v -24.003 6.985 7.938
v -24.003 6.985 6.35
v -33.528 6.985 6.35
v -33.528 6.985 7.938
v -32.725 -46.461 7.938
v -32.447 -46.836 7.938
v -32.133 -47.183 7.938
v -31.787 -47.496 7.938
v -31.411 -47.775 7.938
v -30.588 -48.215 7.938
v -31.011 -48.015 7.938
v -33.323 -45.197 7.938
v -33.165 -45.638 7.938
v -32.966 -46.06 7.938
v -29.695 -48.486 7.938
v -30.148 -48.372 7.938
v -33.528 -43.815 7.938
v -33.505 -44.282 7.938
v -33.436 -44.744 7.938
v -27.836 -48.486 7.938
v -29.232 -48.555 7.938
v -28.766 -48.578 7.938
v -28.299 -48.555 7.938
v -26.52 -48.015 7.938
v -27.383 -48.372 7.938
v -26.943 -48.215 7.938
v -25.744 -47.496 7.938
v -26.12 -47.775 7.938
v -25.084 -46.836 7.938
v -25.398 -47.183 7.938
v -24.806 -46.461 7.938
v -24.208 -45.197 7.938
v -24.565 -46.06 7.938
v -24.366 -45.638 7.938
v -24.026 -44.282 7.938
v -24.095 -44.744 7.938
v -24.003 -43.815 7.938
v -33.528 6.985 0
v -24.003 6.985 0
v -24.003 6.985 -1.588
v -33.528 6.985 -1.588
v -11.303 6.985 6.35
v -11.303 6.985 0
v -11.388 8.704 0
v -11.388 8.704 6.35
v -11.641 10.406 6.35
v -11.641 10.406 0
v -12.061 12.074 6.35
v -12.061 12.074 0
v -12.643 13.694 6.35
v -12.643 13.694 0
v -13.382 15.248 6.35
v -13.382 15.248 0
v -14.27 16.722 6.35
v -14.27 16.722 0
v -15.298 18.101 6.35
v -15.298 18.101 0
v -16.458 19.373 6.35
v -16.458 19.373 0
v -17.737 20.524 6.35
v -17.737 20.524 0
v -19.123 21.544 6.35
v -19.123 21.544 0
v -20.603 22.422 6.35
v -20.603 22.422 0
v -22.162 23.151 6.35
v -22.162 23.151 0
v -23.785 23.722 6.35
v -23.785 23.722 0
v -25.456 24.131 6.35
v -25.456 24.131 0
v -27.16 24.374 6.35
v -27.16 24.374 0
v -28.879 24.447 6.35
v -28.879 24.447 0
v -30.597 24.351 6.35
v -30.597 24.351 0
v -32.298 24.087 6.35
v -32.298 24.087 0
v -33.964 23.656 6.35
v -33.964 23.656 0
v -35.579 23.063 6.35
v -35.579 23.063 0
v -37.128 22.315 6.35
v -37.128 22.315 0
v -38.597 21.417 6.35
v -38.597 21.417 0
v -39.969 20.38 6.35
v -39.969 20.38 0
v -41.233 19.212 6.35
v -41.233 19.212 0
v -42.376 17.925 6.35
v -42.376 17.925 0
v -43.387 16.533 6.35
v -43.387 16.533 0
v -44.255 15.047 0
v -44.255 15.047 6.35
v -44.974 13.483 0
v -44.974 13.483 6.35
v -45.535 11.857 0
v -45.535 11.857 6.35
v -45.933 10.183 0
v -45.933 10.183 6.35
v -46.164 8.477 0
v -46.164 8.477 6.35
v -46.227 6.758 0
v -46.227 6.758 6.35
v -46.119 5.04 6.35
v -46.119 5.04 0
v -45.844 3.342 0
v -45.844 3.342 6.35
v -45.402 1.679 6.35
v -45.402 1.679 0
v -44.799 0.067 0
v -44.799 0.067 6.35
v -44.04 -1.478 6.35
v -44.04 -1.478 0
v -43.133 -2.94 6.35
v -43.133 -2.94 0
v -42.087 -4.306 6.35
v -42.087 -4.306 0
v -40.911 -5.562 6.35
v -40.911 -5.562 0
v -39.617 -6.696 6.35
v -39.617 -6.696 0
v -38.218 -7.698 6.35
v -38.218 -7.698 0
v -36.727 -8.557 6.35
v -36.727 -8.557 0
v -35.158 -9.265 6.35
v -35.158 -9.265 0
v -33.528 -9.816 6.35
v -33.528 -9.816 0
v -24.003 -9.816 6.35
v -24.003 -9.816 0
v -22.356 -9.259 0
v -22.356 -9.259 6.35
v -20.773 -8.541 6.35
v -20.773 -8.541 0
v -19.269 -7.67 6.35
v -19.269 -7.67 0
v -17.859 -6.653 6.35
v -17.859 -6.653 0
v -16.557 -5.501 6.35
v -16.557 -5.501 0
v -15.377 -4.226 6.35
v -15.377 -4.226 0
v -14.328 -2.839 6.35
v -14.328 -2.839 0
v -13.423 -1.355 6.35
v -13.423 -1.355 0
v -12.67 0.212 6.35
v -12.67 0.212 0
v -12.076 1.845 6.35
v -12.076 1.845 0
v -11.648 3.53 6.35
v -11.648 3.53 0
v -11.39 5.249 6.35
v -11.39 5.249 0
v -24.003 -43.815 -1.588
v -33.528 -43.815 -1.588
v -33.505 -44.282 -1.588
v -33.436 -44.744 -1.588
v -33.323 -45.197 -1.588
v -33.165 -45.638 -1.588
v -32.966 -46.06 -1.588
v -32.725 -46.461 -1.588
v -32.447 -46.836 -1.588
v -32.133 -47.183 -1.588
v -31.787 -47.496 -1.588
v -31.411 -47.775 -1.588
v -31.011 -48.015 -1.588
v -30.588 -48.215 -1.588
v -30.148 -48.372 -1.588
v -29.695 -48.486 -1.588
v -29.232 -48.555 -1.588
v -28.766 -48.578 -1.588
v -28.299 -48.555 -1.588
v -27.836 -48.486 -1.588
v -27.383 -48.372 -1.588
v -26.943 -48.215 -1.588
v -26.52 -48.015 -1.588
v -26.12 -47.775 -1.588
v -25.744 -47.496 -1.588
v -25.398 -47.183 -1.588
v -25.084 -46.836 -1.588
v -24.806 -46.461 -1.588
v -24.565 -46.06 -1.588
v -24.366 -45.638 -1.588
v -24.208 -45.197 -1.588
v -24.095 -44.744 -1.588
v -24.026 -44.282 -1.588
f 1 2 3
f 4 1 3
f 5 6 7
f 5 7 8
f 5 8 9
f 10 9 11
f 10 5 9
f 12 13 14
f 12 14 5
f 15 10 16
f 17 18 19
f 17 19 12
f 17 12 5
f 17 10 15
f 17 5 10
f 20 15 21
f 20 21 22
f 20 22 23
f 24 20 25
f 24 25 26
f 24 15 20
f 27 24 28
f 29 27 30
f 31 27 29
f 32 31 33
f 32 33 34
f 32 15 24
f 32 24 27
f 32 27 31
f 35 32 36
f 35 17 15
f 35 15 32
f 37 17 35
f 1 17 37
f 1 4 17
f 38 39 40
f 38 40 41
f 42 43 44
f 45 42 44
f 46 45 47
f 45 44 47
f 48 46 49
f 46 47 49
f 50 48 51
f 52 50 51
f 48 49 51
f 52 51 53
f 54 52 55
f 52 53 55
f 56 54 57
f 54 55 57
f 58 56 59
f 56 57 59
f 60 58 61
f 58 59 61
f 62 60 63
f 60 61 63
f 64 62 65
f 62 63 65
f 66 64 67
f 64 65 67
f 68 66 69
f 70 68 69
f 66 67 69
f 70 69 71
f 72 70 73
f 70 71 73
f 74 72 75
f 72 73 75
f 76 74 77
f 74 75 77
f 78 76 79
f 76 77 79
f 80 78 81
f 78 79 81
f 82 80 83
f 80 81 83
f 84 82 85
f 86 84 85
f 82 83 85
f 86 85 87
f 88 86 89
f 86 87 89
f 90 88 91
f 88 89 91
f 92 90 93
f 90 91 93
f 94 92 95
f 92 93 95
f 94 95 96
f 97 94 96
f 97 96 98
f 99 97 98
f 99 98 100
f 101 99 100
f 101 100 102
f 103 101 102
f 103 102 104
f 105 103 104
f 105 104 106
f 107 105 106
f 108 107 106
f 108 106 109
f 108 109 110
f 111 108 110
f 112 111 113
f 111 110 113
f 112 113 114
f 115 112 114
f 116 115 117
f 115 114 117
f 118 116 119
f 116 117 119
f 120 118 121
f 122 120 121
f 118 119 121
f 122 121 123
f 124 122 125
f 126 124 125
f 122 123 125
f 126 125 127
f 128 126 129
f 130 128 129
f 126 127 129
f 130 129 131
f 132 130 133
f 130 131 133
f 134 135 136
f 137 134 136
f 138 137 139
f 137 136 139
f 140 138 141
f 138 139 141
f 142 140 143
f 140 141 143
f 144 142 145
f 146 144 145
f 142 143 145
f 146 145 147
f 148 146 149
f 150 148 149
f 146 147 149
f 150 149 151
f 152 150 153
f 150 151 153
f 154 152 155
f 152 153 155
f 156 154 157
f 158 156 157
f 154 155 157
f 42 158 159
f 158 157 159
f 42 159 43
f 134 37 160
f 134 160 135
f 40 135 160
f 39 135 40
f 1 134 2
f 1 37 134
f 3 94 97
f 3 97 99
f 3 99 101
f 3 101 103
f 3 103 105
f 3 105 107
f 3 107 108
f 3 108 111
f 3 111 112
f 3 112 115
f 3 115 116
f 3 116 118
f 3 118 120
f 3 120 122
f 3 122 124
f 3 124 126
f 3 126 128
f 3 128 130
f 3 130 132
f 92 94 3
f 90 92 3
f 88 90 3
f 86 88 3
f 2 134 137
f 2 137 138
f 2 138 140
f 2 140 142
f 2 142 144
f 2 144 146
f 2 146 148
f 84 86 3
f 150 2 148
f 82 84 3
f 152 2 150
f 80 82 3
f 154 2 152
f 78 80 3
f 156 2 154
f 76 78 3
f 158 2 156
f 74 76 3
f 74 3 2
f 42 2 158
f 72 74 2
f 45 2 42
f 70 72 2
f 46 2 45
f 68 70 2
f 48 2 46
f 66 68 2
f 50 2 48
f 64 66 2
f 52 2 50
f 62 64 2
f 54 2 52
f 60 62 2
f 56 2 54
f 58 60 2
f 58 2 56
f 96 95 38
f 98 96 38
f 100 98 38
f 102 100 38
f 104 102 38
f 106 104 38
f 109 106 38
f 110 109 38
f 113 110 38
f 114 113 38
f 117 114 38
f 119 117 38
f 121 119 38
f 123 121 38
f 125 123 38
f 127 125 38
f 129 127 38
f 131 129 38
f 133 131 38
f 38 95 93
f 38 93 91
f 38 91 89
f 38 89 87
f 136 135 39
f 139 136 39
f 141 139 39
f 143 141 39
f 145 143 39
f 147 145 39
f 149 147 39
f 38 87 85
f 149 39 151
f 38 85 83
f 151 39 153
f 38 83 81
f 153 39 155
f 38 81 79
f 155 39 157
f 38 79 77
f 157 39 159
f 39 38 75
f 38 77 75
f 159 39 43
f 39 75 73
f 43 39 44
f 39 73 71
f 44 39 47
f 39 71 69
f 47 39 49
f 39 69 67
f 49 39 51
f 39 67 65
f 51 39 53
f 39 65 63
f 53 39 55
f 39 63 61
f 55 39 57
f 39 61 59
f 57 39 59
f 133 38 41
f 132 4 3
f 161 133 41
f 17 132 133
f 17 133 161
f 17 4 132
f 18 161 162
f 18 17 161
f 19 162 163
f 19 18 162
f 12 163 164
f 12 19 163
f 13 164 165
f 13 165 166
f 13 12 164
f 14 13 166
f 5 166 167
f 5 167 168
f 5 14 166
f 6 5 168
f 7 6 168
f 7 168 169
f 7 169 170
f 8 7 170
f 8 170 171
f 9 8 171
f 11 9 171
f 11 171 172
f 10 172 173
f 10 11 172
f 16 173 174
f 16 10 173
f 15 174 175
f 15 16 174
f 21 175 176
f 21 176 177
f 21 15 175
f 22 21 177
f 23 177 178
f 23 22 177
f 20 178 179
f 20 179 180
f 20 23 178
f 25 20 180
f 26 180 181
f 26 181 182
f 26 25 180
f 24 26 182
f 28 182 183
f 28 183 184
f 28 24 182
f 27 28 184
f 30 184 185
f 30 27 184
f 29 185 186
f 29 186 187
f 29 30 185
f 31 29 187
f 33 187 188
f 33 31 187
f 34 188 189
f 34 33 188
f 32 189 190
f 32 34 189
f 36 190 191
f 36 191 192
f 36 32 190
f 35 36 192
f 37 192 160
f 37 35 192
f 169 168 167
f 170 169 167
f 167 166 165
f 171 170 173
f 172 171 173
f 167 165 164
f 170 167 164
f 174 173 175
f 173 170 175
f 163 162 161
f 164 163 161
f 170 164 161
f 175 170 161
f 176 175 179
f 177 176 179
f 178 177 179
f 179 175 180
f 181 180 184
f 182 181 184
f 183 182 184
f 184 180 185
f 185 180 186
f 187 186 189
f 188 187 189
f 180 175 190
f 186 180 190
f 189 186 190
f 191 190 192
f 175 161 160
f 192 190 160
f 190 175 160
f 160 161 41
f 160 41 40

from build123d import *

# Parameters (mm, degrees)
F1_DEPTH = 6.35
F2_DEPTH = 7.9375
F3_DEPTH = 1.5875


# Not quite as in the source:
# - a length typed as a fraction of an inch, garbled in the dataset ("3 / 203.2 mm" for 3/8 in), is restored


with BuildPart() as f1:
    # F0 (on Top) → F1 (new body)
    with BuildSketch(Plane.XY):
        with BuildLine():
            ThreePointArc((-24.0030003875, -9.8155226706), (-14.8352444226, -3.5452855547), (-11.3030003875, 6.9849981546))
            ThreePointArc((-11.3030003875, 6.9849981546), (-39.2957840969, 20.9152541196), (-33.5280003875, -9.8155226706))
            Line((-33.5280003875, -9.8155226706), (-33.5280003875, 6.9849981546))
            Line((-33.5280003875, 6.9849981546), (-24.0030003875, 6.9849981546))
            Line((-24.0030003875, 6.9849981546), (-24.0030003875, -9.8155226706))
        make_face()
    extrude(amount=F1_DEPTH)

    # F0 (on Top) → F2 (join)
    with BuildSketch(Plane.XY):
        with BuildLine():
            Line((-33.5280003875, 6.9849981546), (-33.5280003875, -9.8155226706))
            ThreePointArc((-33.5280003875, -9.8155226706), (-28.7655003875, -10.4775018454), (-24.0030003875, -9.8155226706))
            Line((-24.0030003875, -9.8155226706), (-24.0030003875, 6.9849981546))
            Line((-24.0030003875, 6.9849981546), (-33.5280003875, 6.9849981546))
        make_face()
        with BuildLine():
            ThreePointArc((-24.0030003875, -9.8155226706), (-28.7655003875, -10.4775018454), (-33.5280003875, -9.8155226706))
            Line((-33.5280003875, -9.8155226706), (-33.5280003875, -43.8150018454))
            ThreePointArc((-33.5280003875, -43.8150018454), (-28.7655003875, -48.5775018454), (-24.0030003875, -43.8150018454))
            Line((-24.0030003875, -43.8150018454), (-24.0030003875, -9.8155226706))
        make_face()
    extrude(amount=F2_DEPTH)

    # F0 (on Top) → F3 (join)
    with BuildSketch(Plane.XY):
        with BuildLine():
            ThreePointArc((-24.0030003875, -9.8155226706), (-28.7655003875, -10.4775018454), (-33.5280003875, -9.8155226706))
            Line((-33.5280003875, -9.8155226706), (-33.5280003875, -43.8150018454))
            ThreePointArc((-33.5280003875, -43.8150018454), (-28.7655003875, -48.5775018454), (-24.0030003875, -43.8150018454))
            Line((-24.0030003875, -43.8150018454), (-24.0030003875, -9.8155226706))
        make_face()
        with BuildLine():
            Line((-33.5280003875, 6.9849981546), (-33.5280003875, -9.8155226706))
            ThreePointArc((-33.5280003875, -9.8155226706), (-28.7655003875, -10.4775018454), (-24.0030003875, -9.8155226706))
            Line((-24.0030003875, -9.8155226706), (-24.0030003875, 6.9849981546))
            Line((-24.0030003875, 6.9849981546), (-33.5280003875, 6.9849981546))
        make_face()
    extrude(amount=-F3_DEPTH)


solid = f1.part
